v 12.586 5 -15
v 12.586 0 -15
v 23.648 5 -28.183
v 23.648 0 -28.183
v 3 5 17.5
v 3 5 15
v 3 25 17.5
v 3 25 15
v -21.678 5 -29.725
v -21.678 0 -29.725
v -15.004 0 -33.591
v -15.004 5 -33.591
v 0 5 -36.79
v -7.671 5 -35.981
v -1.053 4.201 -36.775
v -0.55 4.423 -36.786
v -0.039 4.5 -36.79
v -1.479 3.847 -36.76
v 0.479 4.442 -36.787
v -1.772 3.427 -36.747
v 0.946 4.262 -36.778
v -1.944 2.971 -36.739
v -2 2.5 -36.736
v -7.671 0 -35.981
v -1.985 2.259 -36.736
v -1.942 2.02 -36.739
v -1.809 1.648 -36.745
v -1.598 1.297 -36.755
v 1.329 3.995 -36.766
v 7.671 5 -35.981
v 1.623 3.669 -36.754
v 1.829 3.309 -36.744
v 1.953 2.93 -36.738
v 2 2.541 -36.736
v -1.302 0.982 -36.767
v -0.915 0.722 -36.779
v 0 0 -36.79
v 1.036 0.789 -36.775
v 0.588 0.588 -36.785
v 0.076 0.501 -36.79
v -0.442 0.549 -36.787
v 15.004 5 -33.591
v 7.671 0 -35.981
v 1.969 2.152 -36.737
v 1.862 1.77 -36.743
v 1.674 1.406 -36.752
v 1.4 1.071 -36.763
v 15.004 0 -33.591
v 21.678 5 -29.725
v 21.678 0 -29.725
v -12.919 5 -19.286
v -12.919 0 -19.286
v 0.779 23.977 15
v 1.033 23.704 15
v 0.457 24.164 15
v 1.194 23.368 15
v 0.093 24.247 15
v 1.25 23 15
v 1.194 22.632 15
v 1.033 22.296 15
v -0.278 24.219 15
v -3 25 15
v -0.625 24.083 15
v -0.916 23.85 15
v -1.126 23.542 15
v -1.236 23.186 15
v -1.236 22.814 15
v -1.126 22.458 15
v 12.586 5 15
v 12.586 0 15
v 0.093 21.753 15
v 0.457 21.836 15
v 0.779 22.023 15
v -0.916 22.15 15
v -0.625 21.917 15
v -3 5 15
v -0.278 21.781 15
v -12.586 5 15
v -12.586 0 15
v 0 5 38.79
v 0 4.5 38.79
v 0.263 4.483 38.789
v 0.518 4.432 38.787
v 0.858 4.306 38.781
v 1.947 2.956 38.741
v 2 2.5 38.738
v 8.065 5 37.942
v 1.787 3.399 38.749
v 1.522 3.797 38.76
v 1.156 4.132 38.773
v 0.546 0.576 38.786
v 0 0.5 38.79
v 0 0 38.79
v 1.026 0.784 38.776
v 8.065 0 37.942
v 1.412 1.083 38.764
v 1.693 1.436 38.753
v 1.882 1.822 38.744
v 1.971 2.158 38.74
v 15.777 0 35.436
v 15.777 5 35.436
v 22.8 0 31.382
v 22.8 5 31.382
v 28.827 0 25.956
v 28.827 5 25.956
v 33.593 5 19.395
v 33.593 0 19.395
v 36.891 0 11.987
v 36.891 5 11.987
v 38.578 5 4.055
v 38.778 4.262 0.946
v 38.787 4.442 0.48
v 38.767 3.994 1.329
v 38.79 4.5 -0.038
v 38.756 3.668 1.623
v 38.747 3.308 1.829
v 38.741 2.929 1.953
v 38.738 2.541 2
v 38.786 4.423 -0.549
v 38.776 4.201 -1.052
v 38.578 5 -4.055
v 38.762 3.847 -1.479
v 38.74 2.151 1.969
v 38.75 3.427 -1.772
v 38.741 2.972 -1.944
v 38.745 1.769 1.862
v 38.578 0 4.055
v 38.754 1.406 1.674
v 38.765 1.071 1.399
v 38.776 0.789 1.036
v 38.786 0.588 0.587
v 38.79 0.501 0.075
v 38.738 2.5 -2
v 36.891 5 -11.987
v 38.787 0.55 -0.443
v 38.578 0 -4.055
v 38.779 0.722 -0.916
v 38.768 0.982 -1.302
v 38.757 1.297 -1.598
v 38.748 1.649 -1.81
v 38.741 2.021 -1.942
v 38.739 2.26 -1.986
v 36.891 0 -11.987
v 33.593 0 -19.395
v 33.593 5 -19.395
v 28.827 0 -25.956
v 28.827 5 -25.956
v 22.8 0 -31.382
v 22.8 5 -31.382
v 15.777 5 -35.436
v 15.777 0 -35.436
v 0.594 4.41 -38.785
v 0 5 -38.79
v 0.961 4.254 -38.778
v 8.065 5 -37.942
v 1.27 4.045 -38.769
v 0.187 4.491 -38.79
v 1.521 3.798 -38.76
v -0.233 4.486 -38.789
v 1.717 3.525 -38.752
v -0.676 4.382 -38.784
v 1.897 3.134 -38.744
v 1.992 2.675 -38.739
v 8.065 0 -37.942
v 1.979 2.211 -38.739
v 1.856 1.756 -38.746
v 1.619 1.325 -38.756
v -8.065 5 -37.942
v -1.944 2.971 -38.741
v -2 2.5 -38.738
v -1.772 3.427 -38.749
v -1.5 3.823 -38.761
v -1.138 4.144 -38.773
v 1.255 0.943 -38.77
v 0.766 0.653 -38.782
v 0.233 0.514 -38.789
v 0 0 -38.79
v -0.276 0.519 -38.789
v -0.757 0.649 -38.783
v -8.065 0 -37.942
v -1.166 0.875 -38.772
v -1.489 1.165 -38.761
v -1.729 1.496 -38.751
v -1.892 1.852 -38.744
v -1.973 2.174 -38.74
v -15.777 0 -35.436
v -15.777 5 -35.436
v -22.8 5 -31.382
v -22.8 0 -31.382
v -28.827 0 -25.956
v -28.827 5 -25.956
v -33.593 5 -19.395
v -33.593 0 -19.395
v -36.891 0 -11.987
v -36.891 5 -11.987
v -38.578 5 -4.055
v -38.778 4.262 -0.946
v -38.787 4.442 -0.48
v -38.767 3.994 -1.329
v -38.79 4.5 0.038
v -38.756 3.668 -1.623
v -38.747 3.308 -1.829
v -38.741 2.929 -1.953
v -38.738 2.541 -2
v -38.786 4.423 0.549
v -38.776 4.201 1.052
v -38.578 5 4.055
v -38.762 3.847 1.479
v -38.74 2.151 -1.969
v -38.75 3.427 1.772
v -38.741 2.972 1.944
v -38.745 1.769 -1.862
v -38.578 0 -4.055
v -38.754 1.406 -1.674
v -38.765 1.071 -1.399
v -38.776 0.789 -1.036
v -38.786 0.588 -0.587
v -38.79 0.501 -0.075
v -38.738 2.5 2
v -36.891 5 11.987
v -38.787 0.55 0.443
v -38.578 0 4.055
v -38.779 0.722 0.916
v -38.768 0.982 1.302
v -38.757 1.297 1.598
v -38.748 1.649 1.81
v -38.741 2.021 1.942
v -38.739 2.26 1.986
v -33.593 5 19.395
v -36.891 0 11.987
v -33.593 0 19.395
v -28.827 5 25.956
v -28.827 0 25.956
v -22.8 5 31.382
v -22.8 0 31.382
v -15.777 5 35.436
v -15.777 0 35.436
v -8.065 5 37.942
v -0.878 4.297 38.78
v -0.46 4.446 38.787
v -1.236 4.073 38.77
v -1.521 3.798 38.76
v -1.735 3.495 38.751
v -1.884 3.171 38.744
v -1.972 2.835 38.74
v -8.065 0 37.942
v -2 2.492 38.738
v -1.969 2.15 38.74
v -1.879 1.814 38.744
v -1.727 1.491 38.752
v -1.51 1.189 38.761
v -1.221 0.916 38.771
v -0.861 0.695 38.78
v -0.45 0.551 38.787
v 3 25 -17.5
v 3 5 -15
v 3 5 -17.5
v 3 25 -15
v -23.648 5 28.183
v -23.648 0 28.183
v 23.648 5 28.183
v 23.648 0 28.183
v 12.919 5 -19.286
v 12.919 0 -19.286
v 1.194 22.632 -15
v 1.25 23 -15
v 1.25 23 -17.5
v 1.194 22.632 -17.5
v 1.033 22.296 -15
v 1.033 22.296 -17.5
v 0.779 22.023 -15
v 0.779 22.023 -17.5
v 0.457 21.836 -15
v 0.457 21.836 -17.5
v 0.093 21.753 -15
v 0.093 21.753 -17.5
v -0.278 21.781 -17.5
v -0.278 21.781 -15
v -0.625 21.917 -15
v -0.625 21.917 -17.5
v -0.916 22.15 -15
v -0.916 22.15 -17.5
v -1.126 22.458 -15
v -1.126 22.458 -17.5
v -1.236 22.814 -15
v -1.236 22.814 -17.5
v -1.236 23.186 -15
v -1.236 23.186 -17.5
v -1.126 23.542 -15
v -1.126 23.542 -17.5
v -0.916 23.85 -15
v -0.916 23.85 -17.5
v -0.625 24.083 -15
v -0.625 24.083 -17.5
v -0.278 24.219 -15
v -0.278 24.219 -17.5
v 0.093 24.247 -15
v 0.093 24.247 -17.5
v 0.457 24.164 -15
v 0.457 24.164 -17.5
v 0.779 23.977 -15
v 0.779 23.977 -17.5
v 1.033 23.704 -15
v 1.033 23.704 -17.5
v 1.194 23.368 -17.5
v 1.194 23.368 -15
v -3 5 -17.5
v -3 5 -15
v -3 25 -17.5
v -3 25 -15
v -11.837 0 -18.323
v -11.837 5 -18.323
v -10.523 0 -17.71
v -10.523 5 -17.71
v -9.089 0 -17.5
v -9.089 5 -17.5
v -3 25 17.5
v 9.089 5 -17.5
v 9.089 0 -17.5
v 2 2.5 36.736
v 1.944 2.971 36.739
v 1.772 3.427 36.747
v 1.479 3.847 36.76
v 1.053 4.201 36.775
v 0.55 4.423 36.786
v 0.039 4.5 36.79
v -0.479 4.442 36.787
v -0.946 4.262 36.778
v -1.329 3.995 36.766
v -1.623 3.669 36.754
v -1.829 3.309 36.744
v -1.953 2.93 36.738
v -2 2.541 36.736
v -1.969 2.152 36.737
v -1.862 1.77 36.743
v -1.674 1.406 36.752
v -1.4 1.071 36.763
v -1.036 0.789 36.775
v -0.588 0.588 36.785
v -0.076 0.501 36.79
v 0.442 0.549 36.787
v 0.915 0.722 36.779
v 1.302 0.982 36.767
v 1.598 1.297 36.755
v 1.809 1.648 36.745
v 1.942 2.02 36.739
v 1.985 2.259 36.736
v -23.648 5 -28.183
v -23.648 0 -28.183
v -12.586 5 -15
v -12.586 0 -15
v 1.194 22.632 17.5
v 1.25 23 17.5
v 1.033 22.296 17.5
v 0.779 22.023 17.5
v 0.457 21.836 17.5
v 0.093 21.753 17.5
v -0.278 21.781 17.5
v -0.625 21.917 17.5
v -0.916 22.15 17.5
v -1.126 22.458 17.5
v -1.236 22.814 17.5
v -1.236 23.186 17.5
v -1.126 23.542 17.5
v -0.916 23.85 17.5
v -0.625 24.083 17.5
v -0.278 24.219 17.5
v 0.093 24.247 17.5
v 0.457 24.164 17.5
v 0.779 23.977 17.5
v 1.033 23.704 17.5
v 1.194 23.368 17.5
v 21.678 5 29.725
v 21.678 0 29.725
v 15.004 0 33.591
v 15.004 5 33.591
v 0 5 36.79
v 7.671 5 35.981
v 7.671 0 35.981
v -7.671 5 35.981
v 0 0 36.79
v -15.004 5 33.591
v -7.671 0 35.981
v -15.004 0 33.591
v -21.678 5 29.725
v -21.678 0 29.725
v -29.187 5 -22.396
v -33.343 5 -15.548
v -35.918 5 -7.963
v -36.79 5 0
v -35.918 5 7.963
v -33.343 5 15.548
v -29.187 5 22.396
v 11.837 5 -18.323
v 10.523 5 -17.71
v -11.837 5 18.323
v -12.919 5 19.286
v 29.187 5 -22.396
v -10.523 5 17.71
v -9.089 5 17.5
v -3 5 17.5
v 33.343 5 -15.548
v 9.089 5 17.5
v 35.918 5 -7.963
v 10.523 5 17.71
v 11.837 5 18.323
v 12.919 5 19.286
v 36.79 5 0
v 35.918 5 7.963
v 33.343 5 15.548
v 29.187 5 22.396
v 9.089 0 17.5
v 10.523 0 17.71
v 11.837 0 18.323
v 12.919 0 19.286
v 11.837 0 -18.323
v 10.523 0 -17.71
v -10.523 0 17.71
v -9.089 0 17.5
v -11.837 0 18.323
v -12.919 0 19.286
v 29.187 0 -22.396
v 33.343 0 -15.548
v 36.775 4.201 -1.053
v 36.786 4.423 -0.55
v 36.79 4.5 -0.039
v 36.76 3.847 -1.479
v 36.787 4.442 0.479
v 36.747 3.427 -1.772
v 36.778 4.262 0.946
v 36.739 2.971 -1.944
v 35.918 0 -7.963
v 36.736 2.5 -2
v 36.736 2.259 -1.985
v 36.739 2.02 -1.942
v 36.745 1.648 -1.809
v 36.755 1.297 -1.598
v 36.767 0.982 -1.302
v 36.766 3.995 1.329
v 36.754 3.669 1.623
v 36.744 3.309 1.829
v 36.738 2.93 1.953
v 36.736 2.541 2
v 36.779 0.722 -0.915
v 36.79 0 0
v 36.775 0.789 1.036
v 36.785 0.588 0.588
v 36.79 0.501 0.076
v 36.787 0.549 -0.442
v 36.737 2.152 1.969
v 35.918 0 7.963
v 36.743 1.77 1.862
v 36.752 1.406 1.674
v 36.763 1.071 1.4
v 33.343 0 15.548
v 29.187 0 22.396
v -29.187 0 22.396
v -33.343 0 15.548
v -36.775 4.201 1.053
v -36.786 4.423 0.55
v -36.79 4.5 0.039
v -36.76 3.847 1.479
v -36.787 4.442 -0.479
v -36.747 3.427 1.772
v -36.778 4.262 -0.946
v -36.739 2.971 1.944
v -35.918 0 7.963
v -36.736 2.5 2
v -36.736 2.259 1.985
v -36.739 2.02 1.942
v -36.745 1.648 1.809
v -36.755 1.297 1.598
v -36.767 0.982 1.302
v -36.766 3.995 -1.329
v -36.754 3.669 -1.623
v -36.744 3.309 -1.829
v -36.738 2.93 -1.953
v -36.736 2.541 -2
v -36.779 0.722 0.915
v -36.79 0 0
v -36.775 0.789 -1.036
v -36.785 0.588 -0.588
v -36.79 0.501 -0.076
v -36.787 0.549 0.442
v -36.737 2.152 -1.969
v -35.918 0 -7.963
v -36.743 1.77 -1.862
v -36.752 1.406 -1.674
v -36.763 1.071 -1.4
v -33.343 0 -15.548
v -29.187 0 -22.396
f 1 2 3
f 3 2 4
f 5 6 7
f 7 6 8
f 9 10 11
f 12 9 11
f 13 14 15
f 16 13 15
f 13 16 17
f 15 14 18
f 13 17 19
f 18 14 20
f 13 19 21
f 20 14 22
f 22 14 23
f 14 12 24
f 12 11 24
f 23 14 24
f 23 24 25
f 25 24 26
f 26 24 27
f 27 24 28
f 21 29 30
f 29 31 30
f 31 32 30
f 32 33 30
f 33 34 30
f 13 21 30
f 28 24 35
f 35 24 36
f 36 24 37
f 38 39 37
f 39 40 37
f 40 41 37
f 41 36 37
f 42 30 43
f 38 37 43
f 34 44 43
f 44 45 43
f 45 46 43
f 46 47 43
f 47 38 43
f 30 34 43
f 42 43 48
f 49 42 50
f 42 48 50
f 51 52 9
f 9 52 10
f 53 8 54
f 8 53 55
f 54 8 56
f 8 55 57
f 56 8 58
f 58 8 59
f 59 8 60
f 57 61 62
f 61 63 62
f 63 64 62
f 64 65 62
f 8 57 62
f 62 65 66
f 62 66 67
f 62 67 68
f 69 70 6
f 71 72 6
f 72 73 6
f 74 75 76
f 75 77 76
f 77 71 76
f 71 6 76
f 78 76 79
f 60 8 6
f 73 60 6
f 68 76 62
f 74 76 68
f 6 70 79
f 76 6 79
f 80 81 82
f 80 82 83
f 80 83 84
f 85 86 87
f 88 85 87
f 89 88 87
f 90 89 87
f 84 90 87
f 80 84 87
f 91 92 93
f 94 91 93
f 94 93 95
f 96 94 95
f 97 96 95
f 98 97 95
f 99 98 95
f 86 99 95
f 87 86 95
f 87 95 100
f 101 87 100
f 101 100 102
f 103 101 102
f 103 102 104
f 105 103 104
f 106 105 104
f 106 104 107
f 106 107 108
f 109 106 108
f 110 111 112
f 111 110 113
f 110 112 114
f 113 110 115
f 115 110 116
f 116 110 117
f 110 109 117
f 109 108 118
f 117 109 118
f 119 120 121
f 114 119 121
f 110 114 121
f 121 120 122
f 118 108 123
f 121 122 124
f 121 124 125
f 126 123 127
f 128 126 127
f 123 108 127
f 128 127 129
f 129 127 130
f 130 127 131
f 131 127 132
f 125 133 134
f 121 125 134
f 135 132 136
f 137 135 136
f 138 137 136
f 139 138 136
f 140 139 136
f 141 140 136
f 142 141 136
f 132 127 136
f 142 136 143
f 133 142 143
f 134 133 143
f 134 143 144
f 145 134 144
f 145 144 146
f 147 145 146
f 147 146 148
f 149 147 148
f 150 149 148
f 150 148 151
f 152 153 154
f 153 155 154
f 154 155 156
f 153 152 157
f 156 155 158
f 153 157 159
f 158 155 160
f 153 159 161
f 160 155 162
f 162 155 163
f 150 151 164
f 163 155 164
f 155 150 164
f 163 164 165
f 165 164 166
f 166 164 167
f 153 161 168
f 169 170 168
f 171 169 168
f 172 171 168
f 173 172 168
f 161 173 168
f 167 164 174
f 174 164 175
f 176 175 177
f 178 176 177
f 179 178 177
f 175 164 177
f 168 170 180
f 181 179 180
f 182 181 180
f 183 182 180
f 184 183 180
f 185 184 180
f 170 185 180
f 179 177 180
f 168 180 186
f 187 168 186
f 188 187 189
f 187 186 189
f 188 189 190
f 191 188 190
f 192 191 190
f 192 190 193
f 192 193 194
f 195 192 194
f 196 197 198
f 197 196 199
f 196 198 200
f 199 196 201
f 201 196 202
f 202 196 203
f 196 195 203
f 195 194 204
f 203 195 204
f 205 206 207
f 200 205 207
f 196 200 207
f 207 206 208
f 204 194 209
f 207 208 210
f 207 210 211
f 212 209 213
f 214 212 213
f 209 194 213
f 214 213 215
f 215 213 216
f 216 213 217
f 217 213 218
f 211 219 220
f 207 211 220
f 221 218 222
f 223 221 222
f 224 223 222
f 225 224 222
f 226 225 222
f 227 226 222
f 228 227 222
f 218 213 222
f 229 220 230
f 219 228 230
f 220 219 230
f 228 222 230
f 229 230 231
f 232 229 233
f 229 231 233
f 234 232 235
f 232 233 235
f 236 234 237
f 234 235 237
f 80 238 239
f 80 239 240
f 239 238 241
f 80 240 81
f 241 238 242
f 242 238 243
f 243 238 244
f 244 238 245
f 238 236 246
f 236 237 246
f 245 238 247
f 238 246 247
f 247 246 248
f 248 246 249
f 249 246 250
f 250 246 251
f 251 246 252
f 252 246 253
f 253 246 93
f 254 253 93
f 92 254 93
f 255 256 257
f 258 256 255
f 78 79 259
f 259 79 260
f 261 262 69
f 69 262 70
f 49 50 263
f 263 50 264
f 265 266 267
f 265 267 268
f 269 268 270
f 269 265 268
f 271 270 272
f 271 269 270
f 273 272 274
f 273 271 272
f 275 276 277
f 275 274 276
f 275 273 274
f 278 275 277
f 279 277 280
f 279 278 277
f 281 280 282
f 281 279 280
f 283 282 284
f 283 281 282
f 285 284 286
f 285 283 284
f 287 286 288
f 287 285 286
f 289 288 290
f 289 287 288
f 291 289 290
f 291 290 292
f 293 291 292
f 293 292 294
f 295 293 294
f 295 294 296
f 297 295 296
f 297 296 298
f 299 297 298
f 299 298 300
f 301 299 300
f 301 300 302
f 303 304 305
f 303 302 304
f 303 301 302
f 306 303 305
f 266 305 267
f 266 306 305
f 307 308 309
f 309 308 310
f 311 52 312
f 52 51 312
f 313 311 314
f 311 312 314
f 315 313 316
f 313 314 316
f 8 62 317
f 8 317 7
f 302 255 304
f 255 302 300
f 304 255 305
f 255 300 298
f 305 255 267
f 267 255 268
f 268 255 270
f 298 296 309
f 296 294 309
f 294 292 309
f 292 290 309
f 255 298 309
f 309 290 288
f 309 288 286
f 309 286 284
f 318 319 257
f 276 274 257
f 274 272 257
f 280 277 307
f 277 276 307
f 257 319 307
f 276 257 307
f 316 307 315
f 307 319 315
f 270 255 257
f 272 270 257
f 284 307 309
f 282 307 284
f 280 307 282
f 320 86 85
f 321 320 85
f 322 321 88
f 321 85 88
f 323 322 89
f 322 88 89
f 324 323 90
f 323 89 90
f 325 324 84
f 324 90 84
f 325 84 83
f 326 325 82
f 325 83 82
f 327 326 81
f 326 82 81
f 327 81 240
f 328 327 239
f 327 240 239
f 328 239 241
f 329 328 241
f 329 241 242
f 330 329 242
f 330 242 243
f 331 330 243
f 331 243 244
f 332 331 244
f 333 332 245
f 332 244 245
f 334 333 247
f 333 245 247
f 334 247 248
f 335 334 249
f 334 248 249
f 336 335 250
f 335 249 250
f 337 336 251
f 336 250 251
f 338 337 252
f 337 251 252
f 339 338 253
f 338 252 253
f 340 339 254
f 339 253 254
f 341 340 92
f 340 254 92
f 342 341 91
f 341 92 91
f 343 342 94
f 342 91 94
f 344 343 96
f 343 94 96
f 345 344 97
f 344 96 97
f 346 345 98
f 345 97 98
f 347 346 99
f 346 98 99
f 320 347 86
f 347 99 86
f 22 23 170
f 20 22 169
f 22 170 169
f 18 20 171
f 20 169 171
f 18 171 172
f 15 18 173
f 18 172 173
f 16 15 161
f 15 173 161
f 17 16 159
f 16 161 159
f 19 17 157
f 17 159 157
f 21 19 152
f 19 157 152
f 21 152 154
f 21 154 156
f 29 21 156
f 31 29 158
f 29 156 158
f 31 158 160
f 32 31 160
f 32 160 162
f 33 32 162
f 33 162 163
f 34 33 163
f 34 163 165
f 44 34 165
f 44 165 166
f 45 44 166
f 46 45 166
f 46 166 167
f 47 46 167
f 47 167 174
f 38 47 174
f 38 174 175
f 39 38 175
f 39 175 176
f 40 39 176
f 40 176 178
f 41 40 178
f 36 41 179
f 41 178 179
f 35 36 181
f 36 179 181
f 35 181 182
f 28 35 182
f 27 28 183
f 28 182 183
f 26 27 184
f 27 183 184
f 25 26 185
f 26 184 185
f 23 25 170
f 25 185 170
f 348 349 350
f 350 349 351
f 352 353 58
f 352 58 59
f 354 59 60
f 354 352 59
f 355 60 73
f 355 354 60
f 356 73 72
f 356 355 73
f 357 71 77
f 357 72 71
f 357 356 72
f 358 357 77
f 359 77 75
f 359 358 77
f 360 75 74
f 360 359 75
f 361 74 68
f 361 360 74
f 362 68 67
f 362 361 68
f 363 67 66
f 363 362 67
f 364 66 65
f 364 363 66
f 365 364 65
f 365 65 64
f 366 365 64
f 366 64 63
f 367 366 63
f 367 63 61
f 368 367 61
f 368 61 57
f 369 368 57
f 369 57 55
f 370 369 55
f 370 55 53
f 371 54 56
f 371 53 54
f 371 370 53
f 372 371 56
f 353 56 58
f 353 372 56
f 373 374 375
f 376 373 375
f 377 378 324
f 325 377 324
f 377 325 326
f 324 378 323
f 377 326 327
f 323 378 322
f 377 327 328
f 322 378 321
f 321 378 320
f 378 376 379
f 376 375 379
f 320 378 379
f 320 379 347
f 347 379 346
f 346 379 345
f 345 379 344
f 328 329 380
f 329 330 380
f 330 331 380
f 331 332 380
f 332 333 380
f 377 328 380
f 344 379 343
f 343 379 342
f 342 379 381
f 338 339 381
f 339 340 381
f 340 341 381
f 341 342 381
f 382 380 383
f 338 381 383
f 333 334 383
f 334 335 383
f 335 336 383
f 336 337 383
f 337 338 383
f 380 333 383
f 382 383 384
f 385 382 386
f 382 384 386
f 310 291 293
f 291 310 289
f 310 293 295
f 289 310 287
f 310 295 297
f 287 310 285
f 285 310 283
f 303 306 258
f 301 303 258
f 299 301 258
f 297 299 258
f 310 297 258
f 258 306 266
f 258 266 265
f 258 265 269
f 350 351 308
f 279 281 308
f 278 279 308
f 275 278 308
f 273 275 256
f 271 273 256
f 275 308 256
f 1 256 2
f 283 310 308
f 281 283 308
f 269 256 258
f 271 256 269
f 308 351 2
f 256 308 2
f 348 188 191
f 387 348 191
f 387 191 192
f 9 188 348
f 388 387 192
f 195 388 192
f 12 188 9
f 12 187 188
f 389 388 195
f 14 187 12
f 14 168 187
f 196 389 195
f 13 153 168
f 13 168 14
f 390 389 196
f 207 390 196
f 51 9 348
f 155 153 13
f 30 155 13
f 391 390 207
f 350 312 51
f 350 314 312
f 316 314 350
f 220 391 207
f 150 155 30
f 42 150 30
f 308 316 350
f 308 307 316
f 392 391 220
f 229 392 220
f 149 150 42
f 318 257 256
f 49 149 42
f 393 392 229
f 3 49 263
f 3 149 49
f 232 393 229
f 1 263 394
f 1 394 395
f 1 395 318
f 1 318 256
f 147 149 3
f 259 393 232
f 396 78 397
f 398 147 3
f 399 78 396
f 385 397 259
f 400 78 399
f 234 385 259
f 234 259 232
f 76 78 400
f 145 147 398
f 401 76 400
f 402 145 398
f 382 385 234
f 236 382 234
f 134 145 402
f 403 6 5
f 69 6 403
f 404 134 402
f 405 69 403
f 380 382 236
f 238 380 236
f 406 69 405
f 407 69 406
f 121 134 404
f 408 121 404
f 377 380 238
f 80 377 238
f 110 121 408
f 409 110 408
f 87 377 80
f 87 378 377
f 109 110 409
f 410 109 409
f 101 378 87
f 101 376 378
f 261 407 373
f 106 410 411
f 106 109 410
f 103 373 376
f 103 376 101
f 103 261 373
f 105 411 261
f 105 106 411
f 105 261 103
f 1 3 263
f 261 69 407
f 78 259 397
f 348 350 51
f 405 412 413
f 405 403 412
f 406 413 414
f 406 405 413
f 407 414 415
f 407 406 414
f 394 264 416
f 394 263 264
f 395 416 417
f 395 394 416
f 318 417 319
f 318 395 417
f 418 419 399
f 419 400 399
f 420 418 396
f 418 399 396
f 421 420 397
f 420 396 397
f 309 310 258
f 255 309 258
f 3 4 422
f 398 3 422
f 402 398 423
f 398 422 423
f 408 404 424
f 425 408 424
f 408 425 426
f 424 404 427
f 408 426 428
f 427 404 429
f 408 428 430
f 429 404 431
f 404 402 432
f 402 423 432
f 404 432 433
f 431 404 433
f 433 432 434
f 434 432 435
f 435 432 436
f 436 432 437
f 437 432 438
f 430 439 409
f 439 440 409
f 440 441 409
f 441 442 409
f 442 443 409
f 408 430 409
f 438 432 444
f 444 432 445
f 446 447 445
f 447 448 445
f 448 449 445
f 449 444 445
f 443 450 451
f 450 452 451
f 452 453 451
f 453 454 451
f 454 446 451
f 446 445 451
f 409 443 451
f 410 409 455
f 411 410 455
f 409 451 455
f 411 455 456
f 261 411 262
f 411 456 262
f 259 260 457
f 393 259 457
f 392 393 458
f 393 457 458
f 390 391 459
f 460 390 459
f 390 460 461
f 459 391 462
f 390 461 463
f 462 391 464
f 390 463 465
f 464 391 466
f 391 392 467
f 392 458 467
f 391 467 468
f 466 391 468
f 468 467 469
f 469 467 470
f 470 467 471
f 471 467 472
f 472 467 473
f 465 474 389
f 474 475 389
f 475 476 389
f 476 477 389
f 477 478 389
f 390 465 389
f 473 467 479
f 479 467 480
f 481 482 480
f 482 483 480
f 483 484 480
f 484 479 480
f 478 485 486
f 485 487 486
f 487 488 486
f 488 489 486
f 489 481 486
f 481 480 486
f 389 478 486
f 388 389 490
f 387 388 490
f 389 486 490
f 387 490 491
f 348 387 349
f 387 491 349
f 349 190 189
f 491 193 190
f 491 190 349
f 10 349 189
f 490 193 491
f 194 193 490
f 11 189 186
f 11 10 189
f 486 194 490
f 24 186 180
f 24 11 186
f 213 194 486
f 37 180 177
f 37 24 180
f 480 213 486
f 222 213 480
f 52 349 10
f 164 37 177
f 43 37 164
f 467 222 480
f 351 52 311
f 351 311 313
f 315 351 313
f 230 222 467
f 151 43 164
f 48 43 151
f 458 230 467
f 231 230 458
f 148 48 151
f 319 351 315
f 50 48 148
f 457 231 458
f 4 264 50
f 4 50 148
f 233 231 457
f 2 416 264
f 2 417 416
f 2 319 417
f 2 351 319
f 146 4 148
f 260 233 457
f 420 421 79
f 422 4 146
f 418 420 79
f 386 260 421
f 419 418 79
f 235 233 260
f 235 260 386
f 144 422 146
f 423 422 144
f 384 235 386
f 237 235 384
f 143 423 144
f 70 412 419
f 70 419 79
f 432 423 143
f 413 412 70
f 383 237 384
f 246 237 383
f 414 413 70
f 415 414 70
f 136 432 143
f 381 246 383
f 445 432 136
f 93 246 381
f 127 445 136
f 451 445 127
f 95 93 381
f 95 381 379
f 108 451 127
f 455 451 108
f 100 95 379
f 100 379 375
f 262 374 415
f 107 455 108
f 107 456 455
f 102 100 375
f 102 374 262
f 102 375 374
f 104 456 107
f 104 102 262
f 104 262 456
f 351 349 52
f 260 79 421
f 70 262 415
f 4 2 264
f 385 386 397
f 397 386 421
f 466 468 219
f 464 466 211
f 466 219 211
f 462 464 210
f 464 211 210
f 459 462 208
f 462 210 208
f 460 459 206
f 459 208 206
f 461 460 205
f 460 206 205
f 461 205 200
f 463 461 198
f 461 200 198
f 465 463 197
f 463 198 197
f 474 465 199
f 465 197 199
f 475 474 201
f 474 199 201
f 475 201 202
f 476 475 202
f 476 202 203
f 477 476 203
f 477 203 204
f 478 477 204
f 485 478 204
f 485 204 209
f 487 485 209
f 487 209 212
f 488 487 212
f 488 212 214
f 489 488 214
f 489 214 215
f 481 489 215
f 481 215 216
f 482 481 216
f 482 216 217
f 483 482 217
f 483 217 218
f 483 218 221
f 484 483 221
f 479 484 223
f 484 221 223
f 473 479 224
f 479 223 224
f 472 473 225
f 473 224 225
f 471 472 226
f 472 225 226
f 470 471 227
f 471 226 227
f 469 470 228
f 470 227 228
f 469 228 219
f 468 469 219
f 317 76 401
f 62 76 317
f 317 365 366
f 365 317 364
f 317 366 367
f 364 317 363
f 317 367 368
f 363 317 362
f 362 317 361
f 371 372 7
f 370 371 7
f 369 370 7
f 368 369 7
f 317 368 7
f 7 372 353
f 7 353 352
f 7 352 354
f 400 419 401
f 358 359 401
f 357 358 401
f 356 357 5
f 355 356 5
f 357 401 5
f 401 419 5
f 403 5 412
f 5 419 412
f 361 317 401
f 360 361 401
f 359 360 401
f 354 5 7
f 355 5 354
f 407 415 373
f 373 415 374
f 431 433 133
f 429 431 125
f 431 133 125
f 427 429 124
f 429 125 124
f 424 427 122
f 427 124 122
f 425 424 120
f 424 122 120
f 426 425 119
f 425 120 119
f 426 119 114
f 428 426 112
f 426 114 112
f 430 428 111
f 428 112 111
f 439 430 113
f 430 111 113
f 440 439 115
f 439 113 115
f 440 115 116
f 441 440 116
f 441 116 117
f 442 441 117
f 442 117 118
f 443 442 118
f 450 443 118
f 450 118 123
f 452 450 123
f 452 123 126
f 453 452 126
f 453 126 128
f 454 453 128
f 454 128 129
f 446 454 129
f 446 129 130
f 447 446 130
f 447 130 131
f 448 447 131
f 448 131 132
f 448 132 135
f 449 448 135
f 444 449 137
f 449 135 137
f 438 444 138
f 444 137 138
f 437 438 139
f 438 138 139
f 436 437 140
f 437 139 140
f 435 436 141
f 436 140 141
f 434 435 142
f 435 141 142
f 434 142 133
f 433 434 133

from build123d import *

# Parameters (mm, degrees)
CROQUIS2_R                 = 38.79
SALIENTE_EXTRUIR1_DEPTH    = 5
CROQUIS4_W                 = 6
CROQUIS4_H                 = 25
SALIENTE_EXTRUIR3_DEPTH    = 2.5
CORTAR_EXTRUIR1_DEPTH      = 73.788929103
CORTAR_EXTRUIR1_DEPTH_BACK = 73.788929103
CROQUIS5_R                 = 1.25
REDONDEO1_R                = 5
CORTAR_EXTRUIR2_START      = 50
CROQUIS6_R                 = 2
CORTAR_EXTRUIR2_DEPTH      = 17
MATRIZC1_COUNT             = 4


with BuildPart() as part:
    # Croquis2 → Saliente-Extruir1 (new body)
    with BuildSketch(Plane(origin=(0, 0, 0), x_dir=(1, 0, 0), z_dir=(0, 1, 0))):
        with Locations(Location((0, 0, 0), (0, 0, 270))):
            Circle(CROQUIS2_R)
        with BuildLine():
            Line((-12.586494468, 15), (12.586494468, 15))
            Line((12.586494468, 15), (23.64815616, 28.182775062))
            ThreePointArc((23.64815616, 28.182775062), (36.79, 0), (23.64815616, -28.182775062))
            Line((23.64815616, -28.182775062), (12.586494468, -15))
            Line((12.586494468, -15), (-12.586494468, -15))
            Line((-12.586494468, -15), (-23.64815616, -28.182775062))
            ThreePointArc((-23.64815616, -28.182775062), (-36.79, 0), (-23.64815616, 28.182775062))
            Line((-23.64815616, 28.182775062), (-12.586494468, 15))
        make_face(mode=Mode.SUBTRACT)
        with BuildLine():
            Line((-11.420725322, 17.5), (-21.678382494, 29.724599786))
            ThreePointArc((-21.678382494, 29.724599786), (0, 36.79), (21.678382494, 29.724599786))
            Line((21.678382494, 29.724599786), (11.420725322, 17.5))
            Line((11.420725322, 17.5), (-11.420725322, 17.5))
        make_face(mode=Mode.SUBTRACT)
        with BuildLine():
            ThreePointArc((21.678382494, -29.724599786), (0, -36.79), (-21.678382494, -29.724599786))
            Line((-21.678382494, -29.724599786), (-11.420725322, -17.5))
            Line((-11.420725322, -17.5), (11.420725322, -17.5))
            Line((11.420725322, -17.5), (21.678382494, -29.724599786))
        make_face(mode=Mode.SUBTRACT)
    extrude(amount=SALIENTE_EXTRUIR1_DEPTH)

    # Croquis4 → Saliente-Extruir3 (add)
    with BuildSketch(Plane.XY.offset(15)):
        with Locations((0, 12.5)):
            Rectangle(CROQUIS4_W, CROQUIS4_H)
    saliente_extruir3 = extrude(amount=SALIENTE_EXTRUIR3_DEPTH)

    # Simetría1: Saliente-Extruir3 across plane
    add(saliente_extruir3.mirror(Plane.XY))

    # Croquis5 → Cortar-Extruir1 (cut, two sides: drawn at the far end of the back side and taken through both)
    with BuildSketch(Plane(origin=(0, 0, -17.5), x_dir=(-1, 0, 0), z_dir=(0, 0, -1)).offset(-CORTAR_EXTRUIR1_DEPTH_BACK)):
        with Locations(Location((0, 23, 0), (0, 0, 180))):
            Circle(CROQUIS5_R)
    extrude(amount=CORTAR_EXTRUIR1_DEPTH + CORTAR_EXTRUIR1_DEPTH_BACK, mode=Mode.SUBTRACT)

    # Redondeo1
    redondeo1_edges = [part.edges().sort_by_distance(p)[0] for p in [
        (-11.420725322, 2.5, -17.5),
        (11.420725322, 2.5, -17.5),
        (11.420725322, 2.5, 17.5),
        (-11.420725322, 2.5, 17.5),
    ]]
    fillet(redondeo1_edges, radius=REDONDEO1_R)

    # Croquis6 → Cortar-Extruir2 (cut)
    with BuildSketch(Plane.XY.offset(CORTAR_EXTRUIR2_START)):
        with Locations((0, 2.5)):
            Circle(CROQUIS6_R)
    cortar_extruir2 = extrude(amount=-CORTAR_EXTRUIR2_DEPTH, mode=Mode.SUBTRACT)

    # MatrizC1: Cortar-Extruir2 ×4 about axis
    matrizc1_axis = Axis((0, 0, 0), (0, -1, 0))
    for i in range(1, MATRIZC1_COUNT):
        add(cortar_extruir2.rotate(matrizc1_axis, i * 360 / MATRIZC1_COUNT), mode=Mode.SUBTRACT)


solid = part.part
